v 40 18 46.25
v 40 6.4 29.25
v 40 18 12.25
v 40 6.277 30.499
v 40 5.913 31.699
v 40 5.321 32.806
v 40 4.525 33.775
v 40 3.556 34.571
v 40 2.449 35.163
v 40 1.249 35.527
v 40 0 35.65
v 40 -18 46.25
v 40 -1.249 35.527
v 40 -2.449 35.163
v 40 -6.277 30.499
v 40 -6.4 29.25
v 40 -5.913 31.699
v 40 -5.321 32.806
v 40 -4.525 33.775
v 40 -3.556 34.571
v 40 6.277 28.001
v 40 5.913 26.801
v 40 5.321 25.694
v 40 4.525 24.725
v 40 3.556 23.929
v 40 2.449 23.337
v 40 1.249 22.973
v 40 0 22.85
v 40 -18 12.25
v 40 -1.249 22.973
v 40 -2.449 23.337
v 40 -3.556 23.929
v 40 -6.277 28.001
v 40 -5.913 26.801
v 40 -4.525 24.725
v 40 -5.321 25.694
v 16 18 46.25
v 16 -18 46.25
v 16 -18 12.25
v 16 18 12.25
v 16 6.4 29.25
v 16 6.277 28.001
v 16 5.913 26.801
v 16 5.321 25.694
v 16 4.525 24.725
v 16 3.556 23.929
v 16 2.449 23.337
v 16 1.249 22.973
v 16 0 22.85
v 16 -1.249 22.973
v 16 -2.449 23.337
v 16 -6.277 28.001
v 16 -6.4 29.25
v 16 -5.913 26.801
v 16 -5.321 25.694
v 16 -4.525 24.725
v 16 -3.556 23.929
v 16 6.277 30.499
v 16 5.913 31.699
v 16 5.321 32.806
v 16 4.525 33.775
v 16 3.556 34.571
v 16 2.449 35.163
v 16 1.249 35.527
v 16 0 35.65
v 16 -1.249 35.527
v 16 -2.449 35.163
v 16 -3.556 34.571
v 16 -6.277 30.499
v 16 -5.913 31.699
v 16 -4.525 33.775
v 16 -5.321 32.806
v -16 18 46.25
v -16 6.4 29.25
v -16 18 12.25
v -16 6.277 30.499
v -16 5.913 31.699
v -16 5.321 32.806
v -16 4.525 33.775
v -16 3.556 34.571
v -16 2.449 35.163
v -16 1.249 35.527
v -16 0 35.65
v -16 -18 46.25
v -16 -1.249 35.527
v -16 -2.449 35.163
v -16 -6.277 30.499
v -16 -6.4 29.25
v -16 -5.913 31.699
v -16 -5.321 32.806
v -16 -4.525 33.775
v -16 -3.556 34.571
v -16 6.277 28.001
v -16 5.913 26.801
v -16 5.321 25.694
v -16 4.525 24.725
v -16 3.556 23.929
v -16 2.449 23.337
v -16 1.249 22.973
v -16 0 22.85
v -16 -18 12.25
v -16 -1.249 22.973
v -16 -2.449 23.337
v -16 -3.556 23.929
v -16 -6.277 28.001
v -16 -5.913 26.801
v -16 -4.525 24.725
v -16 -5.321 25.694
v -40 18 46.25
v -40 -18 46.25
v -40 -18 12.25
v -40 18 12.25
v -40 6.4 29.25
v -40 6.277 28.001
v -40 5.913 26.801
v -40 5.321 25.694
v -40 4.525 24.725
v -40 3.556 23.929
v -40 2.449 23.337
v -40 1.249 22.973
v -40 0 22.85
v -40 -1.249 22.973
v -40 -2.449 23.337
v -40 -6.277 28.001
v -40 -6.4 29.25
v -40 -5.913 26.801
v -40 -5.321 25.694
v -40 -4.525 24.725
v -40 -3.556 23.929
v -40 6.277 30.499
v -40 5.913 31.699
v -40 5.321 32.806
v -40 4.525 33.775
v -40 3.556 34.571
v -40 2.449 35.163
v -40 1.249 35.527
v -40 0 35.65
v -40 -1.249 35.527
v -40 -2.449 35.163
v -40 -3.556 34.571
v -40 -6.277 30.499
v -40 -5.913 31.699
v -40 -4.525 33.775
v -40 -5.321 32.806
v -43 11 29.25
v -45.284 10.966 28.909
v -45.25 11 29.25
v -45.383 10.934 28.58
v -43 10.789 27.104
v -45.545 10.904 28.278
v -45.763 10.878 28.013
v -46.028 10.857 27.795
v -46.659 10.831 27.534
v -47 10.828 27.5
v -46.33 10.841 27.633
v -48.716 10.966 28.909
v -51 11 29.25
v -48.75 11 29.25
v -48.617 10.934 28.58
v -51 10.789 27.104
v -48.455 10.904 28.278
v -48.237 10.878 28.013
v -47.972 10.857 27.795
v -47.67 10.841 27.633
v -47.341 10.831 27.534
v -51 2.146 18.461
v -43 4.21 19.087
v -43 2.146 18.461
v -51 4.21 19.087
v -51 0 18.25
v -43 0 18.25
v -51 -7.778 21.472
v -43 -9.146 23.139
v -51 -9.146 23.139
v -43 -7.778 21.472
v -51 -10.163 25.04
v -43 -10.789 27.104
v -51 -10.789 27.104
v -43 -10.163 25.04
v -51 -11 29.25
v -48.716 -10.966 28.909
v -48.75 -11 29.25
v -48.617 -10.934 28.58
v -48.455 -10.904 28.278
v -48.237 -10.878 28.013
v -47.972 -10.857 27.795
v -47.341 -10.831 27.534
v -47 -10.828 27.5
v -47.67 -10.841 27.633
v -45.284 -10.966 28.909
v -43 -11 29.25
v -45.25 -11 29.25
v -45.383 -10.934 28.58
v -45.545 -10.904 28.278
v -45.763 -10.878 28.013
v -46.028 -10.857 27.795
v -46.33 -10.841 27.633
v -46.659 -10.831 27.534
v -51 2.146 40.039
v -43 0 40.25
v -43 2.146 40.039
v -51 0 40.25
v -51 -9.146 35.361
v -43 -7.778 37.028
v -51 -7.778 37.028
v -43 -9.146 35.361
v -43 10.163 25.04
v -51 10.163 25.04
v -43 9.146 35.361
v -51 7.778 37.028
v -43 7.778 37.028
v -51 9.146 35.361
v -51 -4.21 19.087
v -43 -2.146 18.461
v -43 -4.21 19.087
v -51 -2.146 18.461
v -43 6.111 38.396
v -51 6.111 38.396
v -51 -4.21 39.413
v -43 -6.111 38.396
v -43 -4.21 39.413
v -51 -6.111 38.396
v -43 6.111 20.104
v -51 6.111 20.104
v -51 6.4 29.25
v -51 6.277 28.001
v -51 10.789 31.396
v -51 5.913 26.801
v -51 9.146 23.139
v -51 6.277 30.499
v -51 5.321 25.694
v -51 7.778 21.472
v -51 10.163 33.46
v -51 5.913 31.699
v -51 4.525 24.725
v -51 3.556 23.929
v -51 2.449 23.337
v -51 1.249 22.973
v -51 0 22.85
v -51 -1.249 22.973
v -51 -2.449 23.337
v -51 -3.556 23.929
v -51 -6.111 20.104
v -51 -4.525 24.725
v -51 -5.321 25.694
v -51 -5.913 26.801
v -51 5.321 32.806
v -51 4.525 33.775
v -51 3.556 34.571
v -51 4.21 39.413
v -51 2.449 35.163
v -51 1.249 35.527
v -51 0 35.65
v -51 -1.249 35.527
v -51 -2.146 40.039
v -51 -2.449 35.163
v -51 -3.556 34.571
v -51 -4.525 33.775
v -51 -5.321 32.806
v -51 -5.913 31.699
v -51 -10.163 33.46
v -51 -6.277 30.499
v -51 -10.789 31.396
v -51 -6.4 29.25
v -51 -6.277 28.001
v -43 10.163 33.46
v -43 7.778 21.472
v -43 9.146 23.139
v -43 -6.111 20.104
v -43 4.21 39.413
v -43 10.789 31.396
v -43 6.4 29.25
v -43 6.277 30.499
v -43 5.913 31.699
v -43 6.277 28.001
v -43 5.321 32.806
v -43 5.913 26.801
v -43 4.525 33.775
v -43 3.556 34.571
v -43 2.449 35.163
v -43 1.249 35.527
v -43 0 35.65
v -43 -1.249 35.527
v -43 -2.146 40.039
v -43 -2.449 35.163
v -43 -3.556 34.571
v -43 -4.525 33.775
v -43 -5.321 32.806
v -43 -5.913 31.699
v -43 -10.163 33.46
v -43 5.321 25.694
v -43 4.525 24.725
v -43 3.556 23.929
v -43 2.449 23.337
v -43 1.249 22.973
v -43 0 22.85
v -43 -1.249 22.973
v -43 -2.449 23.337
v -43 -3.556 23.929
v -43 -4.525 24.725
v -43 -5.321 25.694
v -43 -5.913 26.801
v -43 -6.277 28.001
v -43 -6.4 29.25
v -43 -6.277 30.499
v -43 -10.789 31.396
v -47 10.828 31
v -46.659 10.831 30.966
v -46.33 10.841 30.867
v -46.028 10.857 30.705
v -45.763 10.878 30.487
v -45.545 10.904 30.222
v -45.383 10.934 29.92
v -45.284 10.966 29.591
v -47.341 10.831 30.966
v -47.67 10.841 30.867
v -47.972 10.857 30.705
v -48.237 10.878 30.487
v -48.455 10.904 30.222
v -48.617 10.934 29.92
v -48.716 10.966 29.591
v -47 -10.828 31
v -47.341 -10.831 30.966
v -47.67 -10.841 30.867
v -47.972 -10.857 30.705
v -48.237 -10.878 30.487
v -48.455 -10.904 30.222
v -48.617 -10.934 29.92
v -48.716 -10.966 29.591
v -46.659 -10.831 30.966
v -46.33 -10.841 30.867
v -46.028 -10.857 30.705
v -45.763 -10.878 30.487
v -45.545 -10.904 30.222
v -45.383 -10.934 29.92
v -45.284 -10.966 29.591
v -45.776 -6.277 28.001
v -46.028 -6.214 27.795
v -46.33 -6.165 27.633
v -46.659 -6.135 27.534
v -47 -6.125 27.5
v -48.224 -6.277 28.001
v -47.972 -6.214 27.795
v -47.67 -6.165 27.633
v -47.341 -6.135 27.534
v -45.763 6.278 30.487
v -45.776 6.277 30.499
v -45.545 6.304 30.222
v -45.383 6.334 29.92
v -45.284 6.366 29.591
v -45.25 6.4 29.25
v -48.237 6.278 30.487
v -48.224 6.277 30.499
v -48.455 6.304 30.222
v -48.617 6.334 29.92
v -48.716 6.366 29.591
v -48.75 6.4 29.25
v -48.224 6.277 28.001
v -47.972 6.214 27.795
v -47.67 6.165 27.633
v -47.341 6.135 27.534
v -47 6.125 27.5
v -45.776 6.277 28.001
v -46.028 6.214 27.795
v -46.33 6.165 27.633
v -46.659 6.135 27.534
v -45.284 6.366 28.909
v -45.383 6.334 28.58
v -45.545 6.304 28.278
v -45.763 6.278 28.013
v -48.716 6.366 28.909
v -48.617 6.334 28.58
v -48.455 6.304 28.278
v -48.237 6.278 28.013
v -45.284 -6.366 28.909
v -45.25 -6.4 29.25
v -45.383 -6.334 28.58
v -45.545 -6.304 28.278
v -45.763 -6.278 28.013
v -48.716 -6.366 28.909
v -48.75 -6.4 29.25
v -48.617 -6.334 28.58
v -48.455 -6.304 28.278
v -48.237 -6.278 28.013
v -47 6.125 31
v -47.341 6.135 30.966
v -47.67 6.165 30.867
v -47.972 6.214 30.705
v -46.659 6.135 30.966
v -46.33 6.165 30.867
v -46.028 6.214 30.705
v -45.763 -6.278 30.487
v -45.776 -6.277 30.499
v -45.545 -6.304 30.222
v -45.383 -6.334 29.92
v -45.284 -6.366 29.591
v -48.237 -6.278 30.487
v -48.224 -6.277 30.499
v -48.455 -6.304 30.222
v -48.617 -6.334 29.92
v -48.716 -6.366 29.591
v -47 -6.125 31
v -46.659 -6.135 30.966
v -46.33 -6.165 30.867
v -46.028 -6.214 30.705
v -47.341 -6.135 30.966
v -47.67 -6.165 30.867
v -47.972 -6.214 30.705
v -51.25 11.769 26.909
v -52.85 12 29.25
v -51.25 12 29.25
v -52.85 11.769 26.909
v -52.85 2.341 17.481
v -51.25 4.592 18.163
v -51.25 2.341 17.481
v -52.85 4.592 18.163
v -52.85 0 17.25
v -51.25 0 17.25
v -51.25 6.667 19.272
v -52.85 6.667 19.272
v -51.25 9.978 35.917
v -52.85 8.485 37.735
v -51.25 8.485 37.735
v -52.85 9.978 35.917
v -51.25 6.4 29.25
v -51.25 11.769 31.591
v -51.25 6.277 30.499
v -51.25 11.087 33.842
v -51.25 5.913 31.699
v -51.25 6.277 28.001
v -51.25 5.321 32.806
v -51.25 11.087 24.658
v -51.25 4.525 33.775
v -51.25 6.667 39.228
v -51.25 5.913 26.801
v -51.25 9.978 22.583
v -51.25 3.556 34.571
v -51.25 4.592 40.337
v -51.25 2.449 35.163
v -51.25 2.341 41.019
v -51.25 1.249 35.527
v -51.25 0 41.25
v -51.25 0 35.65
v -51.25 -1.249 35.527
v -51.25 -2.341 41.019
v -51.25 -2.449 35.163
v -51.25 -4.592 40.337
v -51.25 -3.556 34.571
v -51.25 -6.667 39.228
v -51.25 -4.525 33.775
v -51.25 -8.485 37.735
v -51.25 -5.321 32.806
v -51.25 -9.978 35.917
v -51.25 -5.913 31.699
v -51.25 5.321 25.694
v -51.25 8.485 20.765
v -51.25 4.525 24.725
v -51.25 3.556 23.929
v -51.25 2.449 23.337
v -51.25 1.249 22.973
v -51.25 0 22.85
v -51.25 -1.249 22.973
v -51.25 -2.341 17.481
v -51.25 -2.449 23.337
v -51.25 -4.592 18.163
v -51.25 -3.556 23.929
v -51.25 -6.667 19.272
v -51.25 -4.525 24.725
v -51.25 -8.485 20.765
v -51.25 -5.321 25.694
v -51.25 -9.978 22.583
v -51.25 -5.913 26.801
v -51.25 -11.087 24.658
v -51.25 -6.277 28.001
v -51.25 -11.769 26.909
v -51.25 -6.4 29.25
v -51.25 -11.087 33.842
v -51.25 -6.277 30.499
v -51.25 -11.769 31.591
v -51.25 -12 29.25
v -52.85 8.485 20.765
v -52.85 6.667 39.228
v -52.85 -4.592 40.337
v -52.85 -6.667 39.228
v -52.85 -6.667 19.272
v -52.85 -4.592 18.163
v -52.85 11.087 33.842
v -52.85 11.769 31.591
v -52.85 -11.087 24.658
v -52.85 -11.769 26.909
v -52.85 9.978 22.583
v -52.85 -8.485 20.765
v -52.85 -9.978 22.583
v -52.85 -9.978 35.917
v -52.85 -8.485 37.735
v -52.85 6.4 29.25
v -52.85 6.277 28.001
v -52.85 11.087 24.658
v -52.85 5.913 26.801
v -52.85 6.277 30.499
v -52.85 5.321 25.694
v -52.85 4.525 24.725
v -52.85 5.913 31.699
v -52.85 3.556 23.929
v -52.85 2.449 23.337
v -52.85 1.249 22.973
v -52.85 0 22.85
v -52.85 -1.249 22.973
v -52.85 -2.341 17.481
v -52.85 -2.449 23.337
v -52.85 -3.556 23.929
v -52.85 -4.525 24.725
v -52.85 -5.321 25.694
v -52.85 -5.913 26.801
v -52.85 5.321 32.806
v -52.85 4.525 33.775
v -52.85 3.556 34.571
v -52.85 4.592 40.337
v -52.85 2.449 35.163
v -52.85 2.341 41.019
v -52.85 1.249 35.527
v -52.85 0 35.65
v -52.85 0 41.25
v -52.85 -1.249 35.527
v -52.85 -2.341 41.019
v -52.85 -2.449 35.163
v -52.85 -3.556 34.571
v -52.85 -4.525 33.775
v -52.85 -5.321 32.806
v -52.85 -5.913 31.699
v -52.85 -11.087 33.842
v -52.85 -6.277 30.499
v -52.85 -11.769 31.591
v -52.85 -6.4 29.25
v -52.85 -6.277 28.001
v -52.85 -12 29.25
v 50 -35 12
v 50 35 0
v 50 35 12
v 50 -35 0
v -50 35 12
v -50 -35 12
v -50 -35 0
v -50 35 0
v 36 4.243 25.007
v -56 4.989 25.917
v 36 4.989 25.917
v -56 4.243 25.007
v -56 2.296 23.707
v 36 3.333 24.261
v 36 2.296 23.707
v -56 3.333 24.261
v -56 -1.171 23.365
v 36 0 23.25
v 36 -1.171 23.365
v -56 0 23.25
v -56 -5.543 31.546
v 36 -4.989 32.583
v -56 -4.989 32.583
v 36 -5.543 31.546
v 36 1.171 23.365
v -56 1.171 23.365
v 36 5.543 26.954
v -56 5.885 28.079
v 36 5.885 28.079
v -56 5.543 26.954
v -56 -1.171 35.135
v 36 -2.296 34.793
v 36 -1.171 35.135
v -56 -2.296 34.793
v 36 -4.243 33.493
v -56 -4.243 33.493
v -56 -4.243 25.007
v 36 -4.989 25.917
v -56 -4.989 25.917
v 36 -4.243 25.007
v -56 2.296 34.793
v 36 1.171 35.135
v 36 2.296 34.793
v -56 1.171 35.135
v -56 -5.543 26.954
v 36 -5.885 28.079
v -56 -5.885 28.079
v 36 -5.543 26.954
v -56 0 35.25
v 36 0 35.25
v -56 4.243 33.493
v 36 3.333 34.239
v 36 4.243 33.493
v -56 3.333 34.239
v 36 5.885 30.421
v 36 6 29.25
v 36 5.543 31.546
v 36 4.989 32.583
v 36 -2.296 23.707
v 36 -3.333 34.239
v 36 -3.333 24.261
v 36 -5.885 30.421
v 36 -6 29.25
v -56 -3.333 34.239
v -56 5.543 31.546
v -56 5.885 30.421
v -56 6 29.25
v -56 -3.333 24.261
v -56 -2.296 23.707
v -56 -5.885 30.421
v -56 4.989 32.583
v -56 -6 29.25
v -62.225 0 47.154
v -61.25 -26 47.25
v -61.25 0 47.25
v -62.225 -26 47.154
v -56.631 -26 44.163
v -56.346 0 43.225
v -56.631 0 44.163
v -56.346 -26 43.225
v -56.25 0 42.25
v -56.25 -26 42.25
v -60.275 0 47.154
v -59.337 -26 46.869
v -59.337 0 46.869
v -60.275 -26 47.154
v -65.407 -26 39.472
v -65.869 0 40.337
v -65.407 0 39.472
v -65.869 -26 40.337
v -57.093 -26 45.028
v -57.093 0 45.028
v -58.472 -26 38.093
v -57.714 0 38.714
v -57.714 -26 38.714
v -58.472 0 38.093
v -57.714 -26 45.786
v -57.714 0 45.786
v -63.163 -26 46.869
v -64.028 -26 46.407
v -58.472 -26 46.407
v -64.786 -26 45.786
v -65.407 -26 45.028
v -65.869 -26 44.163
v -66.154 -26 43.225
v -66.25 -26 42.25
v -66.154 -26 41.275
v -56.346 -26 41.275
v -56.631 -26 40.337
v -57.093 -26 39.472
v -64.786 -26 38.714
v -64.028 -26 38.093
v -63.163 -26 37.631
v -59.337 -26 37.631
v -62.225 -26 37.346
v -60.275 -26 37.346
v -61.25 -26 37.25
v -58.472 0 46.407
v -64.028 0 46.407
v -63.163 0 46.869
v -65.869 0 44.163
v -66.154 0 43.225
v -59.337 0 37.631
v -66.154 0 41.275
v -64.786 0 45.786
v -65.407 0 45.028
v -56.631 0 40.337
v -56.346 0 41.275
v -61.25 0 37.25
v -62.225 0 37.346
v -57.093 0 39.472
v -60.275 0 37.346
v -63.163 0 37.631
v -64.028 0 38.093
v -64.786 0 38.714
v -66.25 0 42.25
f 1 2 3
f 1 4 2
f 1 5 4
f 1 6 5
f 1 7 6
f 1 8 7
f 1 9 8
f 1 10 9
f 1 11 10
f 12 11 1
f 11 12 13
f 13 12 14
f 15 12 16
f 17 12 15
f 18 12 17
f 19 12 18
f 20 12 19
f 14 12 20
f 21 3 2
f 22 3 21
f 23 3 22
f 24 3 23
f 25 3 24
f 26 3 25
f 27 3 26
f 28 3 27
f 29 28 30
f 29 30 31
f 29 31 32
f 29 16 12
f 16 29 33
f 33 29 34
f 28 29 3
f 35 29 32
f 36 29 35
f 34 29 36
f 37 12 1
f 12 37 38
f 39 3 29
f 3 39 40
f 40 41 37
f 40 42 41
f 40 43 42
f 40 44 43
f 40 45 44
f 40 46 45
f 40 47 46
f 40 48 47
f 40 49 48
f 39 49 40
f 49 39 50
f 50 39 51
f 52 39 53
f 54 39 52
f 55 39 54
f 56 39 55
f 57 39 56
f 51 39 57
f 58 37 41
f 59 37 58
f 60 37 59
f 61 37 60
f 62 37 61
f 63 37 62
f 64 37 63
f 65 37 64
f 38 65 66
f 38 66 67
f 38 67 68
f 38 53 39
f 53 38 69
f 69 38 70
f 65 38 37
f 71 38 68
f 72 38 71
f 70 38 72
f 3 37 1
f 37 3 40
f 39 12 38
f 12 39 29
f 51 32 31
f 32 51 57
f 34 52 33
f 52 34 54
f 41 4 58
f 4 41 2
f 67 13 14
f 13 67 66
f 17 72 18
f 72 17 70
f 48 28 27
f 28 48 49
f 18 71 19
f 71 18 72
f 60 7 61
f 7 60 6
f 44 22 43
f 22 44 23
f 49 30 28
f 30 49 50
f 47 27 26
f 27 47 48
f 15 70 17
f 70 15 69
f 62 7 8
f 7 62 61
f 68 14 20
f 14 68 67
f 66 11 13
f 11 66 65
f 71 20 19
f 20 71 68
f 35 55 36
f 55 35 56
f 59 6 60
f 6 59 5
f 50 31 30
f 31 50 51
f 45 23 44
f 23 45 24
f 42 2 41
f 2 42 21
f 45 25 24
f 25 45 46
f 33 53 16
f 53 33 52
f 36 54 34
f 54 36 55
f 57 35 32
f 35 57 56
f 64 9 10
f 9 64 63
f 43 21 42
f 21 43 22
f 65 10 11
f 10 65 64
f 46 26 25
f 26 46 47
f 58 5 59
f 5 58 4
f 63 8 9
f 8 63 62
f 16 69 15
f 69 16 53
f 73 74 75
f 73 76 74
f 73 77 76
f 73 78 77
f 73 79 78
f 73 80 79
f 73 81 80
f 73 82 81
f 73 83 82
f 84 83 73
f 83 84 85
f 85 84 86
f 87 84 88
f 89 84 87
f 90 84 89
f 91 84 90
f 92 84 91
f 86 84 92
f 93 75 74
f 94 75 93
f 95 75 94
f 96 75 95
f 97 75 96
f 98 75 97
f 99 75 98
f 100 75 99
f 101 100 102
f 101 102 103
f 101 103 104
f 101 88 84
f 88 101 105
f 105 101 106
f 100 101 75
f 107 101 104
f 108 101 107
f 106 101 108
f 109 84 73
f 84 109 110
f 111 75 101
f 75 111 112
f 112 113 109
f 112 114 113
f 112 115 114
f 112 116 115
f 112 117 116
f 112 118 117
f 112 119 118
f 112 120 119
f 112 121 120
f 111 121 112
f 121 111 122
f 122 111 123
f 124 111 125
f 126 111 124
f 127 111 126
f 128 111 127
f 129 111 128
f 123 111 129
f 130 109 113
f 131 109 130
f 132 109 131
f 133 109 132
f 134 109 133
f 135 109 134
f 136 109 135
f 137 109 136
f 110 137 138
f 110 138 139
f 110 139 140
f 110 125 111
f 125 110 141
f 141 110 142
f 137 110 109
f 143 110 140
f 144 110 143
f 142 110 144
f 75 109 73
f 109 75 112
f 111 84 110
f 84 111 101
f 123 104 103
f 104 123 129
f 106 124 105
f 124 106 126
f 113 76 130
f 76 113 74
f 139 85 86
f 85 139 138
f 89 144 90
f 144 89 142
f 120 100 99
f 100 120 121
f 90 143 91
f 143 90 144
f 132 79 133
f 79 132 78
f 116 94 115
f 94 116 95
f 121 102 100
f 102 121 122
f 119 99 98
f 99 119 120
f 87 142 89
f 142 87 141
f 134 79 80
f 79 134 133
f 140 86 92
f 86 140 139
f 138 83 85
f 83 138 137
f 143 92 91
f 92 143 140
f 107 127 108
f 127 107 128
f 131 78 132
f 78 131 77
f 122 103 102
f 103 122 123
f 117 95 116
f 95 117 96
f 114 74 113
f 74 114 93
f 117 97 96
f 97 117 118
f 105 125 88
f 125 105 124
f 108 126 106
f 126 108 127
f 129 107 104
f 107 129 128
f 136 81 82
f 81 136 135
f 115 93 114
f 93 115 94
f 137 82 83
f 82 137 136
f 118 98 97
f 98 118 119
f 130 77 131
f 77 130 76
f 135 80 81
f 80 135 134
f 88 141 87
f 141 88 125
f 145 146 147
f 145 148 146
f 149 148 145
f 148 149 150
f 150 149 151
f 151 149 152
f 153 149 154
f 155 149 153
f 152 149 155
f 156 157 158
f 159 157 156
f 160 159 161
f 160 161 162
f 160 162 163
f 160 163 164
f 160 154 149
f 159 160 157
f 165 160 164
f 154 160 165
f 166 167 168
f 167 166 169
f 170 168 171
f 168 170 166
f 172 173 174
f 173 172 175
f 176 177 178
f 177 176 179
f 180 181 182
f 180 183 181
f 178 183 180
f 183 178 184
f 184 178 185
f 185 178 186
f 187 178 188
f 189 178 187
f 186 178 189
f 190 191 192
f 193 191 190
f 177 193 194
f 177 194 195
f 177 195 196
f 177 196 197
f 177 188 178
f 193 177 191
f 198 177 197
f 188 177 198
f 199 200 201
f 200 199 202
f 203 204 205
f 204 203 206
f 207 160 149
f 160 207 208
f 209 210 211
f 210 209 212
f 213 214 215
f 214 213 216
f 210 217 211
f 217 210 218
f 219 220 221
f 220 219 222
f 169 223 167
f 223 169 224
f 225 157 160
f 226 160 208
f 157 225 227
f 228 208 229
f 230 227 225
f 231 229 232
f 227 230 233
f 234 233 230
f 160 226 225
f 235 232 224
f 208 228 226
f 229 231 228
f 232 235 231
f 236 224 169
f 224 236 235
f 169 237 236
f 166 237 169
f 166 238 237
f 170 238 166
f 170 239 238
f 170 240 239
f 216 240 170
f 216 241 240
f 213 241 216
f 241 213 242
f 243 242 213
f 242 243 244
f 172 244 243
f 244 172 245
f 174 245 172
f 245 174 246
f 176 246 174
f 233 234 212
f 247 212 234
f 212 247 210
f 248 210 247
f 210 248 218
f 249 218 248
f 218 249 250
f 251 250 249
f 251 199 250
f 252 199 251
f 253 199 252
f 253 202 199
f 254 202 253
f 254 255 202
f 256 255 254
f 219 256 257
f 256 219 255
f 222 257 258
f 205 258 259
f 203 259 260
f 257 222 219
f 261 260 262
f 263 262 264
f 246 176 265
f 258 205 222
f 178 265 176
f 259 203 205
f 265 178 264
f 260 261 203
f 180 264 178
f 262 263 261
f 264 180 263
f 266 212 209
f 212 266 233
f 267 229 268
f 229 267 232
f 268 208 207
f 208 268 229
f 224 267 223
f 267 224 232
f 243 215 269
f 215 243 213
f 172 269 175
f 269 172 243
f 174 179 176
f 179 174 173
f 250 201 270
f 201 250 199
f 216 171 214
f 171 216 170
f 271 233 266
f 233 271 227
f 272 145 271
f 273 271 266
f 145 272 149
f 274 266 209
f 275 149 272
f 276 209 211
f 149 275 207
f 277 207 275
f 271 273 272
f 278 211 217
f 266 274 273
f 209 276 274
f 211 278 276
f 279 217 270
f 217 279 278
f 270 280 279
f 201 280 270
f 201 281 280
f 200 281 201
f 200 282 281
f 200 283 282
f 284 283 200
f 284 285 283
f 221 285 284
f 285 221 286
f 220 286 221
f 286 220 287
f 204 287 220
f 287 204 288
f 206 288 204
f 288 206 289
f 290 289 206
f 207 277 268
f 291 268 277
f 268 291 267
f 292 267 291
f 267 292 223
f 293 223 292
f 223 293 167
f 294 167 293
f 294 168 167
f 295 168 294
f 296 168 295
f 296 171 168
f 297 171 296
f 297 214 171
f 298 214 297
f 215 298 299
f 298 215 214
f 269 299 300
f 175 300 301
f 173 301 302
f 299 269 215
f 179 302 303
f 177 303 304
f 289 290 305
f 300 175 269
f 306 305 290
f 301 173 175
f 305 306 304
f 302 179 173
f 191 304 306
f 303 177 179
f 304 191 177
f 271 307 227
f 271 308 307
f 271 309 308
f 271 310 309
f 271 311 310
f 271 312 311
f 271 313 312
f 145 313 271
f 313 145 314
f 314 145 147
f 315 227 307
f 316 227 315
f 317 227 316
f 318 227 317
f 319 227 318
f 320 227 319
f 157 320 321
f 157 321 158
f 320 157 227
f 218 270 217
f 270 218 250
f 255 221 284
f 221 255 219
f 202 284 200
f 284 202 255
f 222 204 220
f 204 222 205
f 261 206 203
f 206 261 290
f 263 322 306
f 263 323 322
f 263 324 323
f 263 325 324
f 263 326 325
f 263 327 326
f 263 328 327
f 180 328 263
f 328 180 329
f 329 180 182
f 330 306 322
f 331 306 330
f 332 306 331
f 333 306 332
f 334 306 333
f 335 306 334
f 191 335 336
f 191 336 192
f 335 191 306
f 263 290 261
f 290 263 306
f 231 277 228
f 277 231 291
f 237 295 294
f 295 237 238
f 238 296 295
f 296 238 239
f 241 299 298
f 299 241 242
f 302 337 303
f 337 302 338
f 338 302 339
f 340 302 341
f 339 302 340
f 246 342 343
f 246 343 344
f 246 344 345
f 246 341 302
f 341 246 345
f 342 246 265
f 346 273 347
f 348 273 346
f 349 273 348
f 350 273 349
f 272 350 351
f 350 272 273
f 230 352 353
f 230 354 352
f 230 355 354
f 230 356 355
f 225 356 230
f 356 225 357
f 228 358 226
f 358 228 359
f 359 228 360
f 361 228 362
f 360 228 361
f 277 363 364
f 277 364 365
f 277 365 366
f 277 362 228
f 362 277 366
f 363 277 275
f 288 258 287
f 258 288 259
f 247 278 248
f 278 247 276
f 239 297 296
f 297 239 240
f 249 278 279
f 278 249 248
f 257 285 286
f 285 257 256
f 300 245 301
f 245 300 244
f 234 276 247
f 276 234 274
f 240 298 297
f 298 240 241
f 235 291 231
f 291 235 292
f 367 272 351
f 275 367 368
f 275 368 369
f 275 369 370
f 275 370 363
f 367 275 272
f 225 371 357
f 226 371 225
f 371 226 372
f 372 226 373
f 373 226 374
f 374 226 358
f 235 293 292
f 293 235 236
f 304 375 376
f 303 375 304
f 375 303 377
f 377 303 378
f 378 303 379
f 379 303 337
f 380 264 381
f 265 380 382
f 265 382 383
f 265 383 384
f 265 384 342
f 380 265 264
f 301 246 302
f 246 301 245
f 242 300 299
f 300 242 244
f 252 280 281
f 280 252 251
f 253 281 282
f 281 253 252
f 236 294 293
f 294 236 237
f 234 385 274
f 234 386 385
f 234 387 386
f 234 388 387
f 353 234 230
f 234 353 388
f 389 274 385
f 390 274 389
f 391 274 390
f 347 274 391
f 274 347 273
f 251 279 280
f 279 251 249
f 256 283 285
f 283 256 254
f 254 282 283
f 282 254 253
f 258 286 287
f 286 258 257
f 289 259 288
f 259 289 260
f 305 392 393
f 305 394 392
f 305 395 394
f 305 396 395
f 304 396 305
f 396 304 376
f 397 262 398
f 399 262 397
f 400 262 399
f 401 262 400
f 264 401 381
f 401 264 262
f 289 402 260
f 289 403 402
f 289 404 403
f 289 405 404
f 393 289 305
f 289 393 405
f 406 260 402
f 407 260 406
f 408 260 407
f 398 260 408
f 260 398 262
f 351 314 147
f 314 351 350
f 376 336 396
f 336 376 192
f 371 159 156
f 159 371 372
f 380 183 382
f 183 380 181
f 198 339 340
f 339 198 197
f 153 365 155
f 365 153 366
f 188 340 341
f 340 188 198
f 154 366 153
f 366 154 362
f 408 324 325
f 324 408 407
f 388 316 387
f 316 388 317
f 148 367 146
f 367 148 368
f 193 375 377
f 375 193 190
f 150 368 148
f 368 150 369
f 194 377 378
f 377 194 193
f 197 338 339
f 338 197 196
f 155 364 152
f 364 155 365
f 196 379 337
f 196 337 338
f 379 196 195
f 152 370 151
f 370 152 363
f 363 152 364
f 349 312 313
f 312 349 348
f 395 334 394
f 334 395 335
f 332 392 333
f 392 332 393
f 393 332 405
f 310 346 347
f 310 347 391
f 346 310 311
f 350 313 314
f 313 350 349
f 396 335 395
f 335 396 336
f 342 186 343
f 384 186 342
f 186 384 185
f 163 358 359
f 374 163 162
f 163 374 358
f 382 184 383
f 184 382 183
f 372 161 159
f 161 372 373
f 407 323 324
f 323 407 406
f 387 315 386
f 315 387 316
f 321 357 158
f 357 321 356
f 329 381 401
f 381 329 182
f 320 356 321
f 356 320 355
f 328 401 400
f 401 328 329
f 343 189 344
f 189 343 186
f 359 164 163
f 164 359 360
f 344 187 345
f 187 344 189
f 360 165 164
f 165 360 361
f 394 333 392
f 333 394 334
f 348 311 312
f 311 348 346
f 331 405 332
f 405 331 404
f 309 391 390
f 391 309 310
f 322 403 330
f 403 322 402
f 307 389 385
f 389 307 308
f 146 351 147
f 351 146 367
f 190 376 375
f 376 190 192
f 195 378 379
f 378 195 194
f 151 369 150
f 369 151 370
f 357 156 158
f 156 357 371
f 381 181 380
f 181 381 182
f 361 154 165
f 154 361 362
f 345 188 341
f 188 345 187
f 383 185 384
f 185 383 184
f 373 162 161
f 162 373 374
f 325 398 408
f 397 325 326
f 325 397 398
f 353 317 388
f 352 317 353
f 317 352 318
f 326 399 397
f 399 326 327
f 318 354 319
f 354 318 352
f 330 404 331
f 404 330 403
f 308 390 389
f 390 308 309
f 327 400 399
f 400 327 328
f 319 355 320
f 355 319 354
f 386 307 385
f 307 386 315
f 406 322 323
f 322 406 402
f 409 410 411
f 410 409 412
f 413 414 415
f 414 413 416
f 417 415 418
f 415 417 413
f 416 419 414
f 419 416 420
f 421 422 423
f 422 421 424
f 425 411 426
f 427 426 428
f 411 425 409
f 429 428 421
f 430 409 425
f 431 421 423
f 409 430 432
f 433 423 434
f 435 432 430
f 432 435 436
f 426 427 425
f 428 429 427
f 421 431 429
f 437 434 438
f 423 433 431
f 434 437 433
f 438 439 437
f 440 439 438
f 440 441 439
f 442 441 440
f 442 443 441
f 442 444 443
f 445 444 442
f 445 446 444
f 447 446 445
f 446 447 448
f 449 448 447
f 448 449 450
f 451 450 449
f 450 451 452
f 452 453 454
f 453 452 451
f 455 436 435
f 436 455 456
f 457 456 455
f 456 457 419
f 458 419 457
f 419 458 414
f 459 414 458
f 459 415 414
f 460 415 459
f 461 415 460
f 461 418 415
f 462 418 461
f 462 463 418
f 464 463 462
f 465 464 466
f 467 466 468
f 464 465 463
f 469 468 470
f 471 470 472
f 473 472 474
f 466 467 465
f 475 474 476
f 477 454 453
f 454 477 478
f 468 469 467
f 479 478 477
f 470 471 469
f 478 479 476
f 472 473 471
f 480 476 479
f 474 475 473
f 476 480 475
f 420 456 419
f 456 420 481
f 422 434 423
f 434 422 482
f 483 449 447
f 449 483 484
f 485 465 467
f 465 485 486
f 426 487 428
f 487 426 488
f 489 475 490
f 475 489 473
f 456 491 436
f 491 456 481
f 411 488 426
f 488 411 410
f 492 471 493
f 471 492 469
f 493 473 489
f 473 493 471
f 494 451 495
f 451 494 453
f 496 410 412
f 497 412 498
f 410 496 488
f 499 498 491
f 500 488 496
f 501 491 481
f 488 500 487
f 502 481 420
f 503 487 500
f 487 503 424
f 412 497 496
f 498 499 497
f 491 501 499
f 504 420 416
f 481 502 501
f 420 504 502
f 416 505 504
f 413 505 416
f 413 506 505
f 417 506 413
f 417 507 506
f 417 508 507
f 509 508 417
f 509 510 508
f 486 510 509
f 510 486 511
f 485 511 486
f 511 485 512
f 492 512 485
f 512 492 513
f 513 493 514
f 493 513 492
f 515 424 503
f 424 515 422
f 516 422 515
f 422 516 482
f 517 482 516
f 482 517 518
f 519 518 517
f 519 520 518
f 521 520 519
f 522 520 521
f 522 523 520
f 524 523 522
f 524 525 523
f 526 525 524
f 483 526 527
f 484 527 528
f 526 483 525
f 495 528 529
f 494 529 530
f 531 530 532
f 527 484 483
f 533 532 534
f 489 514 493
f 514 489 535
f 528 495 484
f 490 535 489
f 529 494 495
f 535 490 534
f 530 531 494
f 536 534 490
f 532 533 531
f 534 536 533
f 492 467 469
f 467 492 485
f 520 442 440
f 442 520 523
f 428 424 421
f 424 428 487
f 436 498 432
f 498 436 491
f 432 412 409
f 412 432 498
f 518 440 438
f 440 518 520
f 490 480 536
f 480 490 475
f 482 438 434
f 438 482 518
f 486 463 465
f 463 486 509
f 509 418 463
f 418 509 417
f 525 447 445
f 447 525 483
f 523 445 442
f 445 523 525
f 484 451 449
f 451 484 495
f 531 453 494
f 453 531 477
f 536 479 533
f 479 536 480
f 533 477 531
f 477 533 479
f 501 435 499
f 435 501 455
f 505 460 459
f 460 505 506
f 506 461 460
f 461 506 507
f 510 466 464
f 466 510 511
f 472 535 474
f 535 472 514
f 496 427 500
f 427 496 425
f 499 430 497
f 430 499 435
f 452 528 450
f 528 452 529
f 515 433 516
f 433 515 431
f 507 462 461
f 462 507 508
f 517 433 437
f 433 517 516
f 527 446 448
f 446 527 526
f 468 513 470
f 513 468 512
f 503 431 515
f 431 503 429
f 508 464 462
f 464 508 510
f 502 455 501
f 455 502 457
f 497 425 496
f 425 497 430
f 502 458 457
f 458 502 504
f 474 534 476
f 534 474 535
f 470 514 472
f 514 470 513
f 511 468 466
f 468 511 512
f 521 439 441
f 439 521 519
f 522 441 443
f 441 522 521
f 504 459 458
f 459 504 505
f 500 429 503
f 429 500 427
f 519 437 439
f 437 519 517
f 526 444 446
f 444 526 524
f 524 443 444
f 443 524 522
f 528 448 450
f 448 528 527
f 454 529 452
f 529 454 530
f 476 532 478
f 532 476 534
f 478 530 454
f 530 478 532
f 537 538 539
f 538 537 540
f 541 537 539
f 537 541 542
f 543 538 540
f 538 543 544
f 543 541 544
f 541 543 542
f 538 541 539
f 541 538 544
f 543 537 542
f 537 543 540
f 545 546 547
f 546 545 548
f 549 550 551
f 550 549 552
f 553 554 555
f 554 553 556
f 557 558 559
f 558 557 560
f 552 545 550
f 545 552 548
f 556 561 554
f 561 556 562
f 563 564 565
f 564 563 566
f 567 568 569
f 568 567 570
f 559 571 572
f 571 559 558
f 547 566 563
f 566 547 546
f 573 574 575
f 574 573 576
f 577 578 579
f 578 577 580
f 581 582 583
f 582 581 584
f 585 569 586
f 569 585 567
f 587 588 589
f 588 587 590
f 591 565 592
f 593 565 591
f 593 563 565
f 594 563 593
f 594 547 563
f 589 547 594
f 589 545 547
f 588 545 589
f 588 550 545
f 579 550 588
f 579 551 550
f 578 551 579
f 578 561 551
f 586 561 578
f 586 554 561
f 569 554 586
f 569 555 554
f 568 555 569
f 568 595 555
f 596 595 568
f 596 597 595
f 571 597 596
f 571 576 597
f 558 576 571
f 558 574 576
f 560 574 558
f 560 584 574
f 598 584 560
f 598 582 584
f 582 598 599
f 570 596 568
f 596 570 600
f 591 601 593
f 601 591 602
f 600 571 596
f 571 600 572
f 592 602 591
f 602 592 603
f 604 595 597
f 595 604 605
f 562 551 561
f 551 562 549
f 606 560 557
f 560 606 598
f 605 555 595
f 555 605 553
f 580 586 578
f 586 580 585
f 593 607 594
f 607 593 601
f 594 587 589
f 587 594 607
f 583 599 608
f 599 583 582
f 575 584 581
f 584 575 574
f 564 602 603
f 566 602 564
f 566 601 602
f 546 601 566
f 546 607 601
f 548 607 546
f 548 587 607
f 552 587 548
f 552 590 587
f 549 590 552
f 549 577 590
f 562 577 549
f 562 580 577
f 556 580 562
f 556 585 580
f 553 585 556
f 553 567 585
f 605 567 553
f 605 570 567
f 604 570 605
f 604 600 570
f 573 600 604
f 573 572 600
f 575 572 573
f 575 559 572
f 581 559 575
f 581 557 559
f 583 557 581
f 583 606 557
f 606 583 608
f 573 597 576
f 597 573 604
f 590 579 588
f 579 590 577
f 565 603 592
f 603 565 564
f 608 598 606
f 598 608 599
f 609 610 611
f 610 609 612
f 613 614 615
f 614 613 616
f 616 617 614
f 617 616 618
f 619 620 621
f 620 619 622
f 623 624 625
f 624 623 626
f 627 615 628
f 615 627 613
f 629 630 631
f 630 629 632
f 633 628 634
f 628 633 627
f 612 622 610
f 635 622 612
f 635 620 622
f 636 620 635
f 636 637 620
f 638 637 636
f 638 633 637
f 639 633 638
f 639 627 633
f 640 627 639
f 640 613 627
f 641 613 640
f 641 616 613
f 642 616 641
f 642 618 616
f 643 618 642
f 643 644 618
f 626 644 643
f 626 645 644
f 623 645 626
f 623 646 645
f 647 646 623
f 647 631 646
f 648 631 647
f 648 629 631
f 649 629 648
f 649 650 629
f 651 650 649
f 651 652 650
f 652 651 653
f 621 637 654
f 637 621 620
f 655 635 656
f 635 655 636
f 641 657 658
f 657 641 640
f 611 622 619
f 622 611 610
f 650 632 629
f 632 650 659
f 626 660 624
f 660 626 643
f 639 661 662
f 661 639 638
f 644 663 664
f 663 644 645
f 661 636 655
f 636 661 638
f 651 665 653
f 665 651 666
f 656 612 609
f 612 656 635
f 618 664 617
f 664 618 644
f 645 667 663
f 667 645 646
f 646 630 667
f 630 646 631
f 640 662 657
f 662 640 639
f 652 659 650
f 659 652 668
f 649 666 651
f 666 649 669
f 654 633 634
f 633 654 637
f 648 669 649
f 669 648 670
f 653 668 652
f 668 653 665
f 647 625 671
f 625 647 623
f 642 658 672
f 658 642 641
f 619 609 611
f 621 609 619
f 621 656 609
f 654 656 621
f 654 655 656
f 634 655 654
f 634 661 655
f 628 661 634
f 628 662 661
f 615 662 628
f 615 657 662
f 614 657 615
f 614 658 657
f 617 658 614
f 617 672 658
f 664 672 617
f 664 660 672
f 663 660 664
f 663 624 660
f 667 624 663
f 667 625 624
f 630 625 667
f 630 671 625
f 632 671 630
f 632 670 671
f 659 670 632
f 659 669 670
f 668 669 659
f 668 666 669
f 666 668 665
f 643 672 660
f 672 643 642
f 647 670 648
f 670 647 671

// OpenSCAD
$fn = 32;

// ------------------------------------------------------------------------
// Machine vise: screw d12, jaws 24 x 34 mm
// Every part is its own module, assembly() places every instance.
// ------------------------------------------------------------------------

// --- part 1 ---
module vise_bed() {
  difference() {
    translate([-50, -35, 0]) cube([100, 70, 12]);
  }
}

// --- part 2 ---
module vise_jaw() {
  difference() {
    translate([-12, -18, 0]) cube([24, 36, 34]);
    translate([0, 0, 17]) rotate([0, 90, 0]) cylinder(h = 26, d = 12.8, center = true);
  }
}

// --- part 3 ---
module vise_screw() {
  translate([0, 0, -46]) cylinder(h = 92, d = 12);
}

// --- part 4 ---
module screw_collar() {
  difference() {
    cylinder(h = 8, d = 22);
    translate([0, 0, -1]) cylinder(h = 10, d = 12.8);
    translate([0, 0, 4]) rotate([90, 0, 0]) cylinder(h = 24, d = 3.5, center = true);
  }
}

// --- part 5 ---
module screw_washer() {
  difference() {
      translate([0, 0, 0]) cylinder(h = 1.6, d = 24);
      translate([0, 0, -1]) cylinder(h = 3.6, d = 12.8);
    }
}

// --- part 6 ---
module vise_handle() {
  cylinder(h = 26, d = 10);
}

// --- assembly ---
module assembly() {
  color([0.80, 0.24, 0.20]) translate([0, 0, 0]) rotate([0, 0, 0]) vise_bed();
  color([0.20, 0.45, 0.75]) translate([28, 0, 12.25]) rotate([0, 0, 0]) vise_jaw();
  color([0.25, 0.62, 0.32]) translate([-28, 0, 12.25]) rotate([0, 0, 0]) vise_jaw();
  color([0.92, 0.70, 0.18]) translate([-10, 0, 29.25]) rotate([0, 90, 0]) vise_screw();
  color([0.58, 0.35, 0.70]) translate([-51, 0, 29.25]) rotate([0, 90, 0]) screw_collar();
  color([0.16, 0.66, 0.66]) translate([-52.85, 0, 29.25]) rotate([0, 90, 0]) screw_washer();
  color([0.85, 0.48, 0.18]) translate([-61.25, 0, 42.25]) rotate([90, 0, 0]) vise_handle();
}

assembly();
